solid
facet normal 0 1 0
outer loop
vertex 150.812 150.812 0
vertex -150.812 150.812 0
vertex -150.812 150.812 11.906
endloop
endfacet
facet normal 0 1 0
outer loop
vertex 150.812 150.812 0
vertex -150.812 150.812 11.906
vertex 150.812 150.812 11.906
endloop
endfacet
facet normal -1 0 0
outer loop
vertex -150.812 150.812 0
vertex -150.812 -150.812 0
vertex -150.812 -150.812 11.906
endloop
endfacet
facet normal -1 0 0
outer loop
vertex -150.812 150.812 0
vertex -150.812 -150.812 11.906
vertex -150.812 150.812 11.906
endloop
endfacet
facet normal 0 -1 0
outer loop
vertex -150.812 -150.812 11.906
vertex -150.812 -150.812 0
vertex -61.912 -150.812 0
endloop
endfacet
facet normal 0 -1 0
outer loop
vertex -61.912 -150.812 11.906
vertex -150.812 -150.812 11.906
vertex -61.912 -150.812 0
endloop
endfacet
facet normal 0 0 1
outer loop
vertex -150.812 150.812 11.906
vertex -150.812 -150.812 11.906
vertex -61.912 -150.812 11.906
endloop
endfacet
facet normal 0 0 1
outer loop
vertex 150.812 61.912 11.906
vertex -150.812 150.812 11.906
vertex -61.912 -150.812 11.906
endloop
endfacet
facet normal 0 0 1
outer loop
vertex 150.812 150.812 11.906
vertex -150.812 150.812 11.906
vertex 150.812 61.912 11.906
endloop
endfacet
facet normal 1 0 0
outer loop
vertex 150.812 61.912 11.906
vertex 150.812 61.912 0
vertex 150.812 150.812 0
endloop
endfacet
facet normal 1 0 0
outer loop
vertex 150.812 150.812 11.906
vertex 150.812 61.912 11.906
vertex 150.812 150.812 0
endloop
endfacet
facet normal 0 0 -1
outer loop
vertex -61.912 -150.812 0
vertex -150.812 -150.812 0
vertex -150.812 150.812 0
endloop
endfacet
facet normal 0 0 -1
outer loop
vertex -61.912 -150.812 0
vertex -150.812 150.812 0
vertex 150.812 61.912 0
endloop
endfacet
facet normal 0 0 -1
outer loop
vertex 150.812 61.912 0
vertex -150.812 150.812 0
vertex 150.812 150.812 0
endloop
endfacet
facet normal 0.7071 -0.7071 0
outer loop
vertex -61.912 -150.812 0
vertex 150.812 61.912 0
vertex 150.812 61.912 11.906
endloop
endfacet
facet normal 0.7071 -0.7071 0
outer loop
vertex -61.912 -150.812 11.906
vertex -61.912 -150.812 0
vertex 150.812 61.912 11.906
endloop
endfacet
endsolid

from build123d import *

# Parameters (mm, degrees)
SKETCH1_W           = 301.625
SKETCH1_H           = 301.625
BOSS_EXTRUDE1_DEPTH = 11.90625
CHAMFER1_SIZE       = 212.725


with BuildPart() as part:
    # Sketch1 → Boss-Extrude1 (new body)
    with BuildSketch(Plane.XY):
        Rectangle(SKETCH1_W, SKETCH1_H)
    extrude(amount=BOSS_EXTRUDE1_DEPTH)

    # Chamfer1
    chamfer1_edges = [part.edges().sort_by_distance(p)[0] for p in [
        (150.8125, -150.8125, 5.953125),
    ]]
    chamfer(chamfer1_edges, length=CHAMFER1_SIZE)


solid = part.part
